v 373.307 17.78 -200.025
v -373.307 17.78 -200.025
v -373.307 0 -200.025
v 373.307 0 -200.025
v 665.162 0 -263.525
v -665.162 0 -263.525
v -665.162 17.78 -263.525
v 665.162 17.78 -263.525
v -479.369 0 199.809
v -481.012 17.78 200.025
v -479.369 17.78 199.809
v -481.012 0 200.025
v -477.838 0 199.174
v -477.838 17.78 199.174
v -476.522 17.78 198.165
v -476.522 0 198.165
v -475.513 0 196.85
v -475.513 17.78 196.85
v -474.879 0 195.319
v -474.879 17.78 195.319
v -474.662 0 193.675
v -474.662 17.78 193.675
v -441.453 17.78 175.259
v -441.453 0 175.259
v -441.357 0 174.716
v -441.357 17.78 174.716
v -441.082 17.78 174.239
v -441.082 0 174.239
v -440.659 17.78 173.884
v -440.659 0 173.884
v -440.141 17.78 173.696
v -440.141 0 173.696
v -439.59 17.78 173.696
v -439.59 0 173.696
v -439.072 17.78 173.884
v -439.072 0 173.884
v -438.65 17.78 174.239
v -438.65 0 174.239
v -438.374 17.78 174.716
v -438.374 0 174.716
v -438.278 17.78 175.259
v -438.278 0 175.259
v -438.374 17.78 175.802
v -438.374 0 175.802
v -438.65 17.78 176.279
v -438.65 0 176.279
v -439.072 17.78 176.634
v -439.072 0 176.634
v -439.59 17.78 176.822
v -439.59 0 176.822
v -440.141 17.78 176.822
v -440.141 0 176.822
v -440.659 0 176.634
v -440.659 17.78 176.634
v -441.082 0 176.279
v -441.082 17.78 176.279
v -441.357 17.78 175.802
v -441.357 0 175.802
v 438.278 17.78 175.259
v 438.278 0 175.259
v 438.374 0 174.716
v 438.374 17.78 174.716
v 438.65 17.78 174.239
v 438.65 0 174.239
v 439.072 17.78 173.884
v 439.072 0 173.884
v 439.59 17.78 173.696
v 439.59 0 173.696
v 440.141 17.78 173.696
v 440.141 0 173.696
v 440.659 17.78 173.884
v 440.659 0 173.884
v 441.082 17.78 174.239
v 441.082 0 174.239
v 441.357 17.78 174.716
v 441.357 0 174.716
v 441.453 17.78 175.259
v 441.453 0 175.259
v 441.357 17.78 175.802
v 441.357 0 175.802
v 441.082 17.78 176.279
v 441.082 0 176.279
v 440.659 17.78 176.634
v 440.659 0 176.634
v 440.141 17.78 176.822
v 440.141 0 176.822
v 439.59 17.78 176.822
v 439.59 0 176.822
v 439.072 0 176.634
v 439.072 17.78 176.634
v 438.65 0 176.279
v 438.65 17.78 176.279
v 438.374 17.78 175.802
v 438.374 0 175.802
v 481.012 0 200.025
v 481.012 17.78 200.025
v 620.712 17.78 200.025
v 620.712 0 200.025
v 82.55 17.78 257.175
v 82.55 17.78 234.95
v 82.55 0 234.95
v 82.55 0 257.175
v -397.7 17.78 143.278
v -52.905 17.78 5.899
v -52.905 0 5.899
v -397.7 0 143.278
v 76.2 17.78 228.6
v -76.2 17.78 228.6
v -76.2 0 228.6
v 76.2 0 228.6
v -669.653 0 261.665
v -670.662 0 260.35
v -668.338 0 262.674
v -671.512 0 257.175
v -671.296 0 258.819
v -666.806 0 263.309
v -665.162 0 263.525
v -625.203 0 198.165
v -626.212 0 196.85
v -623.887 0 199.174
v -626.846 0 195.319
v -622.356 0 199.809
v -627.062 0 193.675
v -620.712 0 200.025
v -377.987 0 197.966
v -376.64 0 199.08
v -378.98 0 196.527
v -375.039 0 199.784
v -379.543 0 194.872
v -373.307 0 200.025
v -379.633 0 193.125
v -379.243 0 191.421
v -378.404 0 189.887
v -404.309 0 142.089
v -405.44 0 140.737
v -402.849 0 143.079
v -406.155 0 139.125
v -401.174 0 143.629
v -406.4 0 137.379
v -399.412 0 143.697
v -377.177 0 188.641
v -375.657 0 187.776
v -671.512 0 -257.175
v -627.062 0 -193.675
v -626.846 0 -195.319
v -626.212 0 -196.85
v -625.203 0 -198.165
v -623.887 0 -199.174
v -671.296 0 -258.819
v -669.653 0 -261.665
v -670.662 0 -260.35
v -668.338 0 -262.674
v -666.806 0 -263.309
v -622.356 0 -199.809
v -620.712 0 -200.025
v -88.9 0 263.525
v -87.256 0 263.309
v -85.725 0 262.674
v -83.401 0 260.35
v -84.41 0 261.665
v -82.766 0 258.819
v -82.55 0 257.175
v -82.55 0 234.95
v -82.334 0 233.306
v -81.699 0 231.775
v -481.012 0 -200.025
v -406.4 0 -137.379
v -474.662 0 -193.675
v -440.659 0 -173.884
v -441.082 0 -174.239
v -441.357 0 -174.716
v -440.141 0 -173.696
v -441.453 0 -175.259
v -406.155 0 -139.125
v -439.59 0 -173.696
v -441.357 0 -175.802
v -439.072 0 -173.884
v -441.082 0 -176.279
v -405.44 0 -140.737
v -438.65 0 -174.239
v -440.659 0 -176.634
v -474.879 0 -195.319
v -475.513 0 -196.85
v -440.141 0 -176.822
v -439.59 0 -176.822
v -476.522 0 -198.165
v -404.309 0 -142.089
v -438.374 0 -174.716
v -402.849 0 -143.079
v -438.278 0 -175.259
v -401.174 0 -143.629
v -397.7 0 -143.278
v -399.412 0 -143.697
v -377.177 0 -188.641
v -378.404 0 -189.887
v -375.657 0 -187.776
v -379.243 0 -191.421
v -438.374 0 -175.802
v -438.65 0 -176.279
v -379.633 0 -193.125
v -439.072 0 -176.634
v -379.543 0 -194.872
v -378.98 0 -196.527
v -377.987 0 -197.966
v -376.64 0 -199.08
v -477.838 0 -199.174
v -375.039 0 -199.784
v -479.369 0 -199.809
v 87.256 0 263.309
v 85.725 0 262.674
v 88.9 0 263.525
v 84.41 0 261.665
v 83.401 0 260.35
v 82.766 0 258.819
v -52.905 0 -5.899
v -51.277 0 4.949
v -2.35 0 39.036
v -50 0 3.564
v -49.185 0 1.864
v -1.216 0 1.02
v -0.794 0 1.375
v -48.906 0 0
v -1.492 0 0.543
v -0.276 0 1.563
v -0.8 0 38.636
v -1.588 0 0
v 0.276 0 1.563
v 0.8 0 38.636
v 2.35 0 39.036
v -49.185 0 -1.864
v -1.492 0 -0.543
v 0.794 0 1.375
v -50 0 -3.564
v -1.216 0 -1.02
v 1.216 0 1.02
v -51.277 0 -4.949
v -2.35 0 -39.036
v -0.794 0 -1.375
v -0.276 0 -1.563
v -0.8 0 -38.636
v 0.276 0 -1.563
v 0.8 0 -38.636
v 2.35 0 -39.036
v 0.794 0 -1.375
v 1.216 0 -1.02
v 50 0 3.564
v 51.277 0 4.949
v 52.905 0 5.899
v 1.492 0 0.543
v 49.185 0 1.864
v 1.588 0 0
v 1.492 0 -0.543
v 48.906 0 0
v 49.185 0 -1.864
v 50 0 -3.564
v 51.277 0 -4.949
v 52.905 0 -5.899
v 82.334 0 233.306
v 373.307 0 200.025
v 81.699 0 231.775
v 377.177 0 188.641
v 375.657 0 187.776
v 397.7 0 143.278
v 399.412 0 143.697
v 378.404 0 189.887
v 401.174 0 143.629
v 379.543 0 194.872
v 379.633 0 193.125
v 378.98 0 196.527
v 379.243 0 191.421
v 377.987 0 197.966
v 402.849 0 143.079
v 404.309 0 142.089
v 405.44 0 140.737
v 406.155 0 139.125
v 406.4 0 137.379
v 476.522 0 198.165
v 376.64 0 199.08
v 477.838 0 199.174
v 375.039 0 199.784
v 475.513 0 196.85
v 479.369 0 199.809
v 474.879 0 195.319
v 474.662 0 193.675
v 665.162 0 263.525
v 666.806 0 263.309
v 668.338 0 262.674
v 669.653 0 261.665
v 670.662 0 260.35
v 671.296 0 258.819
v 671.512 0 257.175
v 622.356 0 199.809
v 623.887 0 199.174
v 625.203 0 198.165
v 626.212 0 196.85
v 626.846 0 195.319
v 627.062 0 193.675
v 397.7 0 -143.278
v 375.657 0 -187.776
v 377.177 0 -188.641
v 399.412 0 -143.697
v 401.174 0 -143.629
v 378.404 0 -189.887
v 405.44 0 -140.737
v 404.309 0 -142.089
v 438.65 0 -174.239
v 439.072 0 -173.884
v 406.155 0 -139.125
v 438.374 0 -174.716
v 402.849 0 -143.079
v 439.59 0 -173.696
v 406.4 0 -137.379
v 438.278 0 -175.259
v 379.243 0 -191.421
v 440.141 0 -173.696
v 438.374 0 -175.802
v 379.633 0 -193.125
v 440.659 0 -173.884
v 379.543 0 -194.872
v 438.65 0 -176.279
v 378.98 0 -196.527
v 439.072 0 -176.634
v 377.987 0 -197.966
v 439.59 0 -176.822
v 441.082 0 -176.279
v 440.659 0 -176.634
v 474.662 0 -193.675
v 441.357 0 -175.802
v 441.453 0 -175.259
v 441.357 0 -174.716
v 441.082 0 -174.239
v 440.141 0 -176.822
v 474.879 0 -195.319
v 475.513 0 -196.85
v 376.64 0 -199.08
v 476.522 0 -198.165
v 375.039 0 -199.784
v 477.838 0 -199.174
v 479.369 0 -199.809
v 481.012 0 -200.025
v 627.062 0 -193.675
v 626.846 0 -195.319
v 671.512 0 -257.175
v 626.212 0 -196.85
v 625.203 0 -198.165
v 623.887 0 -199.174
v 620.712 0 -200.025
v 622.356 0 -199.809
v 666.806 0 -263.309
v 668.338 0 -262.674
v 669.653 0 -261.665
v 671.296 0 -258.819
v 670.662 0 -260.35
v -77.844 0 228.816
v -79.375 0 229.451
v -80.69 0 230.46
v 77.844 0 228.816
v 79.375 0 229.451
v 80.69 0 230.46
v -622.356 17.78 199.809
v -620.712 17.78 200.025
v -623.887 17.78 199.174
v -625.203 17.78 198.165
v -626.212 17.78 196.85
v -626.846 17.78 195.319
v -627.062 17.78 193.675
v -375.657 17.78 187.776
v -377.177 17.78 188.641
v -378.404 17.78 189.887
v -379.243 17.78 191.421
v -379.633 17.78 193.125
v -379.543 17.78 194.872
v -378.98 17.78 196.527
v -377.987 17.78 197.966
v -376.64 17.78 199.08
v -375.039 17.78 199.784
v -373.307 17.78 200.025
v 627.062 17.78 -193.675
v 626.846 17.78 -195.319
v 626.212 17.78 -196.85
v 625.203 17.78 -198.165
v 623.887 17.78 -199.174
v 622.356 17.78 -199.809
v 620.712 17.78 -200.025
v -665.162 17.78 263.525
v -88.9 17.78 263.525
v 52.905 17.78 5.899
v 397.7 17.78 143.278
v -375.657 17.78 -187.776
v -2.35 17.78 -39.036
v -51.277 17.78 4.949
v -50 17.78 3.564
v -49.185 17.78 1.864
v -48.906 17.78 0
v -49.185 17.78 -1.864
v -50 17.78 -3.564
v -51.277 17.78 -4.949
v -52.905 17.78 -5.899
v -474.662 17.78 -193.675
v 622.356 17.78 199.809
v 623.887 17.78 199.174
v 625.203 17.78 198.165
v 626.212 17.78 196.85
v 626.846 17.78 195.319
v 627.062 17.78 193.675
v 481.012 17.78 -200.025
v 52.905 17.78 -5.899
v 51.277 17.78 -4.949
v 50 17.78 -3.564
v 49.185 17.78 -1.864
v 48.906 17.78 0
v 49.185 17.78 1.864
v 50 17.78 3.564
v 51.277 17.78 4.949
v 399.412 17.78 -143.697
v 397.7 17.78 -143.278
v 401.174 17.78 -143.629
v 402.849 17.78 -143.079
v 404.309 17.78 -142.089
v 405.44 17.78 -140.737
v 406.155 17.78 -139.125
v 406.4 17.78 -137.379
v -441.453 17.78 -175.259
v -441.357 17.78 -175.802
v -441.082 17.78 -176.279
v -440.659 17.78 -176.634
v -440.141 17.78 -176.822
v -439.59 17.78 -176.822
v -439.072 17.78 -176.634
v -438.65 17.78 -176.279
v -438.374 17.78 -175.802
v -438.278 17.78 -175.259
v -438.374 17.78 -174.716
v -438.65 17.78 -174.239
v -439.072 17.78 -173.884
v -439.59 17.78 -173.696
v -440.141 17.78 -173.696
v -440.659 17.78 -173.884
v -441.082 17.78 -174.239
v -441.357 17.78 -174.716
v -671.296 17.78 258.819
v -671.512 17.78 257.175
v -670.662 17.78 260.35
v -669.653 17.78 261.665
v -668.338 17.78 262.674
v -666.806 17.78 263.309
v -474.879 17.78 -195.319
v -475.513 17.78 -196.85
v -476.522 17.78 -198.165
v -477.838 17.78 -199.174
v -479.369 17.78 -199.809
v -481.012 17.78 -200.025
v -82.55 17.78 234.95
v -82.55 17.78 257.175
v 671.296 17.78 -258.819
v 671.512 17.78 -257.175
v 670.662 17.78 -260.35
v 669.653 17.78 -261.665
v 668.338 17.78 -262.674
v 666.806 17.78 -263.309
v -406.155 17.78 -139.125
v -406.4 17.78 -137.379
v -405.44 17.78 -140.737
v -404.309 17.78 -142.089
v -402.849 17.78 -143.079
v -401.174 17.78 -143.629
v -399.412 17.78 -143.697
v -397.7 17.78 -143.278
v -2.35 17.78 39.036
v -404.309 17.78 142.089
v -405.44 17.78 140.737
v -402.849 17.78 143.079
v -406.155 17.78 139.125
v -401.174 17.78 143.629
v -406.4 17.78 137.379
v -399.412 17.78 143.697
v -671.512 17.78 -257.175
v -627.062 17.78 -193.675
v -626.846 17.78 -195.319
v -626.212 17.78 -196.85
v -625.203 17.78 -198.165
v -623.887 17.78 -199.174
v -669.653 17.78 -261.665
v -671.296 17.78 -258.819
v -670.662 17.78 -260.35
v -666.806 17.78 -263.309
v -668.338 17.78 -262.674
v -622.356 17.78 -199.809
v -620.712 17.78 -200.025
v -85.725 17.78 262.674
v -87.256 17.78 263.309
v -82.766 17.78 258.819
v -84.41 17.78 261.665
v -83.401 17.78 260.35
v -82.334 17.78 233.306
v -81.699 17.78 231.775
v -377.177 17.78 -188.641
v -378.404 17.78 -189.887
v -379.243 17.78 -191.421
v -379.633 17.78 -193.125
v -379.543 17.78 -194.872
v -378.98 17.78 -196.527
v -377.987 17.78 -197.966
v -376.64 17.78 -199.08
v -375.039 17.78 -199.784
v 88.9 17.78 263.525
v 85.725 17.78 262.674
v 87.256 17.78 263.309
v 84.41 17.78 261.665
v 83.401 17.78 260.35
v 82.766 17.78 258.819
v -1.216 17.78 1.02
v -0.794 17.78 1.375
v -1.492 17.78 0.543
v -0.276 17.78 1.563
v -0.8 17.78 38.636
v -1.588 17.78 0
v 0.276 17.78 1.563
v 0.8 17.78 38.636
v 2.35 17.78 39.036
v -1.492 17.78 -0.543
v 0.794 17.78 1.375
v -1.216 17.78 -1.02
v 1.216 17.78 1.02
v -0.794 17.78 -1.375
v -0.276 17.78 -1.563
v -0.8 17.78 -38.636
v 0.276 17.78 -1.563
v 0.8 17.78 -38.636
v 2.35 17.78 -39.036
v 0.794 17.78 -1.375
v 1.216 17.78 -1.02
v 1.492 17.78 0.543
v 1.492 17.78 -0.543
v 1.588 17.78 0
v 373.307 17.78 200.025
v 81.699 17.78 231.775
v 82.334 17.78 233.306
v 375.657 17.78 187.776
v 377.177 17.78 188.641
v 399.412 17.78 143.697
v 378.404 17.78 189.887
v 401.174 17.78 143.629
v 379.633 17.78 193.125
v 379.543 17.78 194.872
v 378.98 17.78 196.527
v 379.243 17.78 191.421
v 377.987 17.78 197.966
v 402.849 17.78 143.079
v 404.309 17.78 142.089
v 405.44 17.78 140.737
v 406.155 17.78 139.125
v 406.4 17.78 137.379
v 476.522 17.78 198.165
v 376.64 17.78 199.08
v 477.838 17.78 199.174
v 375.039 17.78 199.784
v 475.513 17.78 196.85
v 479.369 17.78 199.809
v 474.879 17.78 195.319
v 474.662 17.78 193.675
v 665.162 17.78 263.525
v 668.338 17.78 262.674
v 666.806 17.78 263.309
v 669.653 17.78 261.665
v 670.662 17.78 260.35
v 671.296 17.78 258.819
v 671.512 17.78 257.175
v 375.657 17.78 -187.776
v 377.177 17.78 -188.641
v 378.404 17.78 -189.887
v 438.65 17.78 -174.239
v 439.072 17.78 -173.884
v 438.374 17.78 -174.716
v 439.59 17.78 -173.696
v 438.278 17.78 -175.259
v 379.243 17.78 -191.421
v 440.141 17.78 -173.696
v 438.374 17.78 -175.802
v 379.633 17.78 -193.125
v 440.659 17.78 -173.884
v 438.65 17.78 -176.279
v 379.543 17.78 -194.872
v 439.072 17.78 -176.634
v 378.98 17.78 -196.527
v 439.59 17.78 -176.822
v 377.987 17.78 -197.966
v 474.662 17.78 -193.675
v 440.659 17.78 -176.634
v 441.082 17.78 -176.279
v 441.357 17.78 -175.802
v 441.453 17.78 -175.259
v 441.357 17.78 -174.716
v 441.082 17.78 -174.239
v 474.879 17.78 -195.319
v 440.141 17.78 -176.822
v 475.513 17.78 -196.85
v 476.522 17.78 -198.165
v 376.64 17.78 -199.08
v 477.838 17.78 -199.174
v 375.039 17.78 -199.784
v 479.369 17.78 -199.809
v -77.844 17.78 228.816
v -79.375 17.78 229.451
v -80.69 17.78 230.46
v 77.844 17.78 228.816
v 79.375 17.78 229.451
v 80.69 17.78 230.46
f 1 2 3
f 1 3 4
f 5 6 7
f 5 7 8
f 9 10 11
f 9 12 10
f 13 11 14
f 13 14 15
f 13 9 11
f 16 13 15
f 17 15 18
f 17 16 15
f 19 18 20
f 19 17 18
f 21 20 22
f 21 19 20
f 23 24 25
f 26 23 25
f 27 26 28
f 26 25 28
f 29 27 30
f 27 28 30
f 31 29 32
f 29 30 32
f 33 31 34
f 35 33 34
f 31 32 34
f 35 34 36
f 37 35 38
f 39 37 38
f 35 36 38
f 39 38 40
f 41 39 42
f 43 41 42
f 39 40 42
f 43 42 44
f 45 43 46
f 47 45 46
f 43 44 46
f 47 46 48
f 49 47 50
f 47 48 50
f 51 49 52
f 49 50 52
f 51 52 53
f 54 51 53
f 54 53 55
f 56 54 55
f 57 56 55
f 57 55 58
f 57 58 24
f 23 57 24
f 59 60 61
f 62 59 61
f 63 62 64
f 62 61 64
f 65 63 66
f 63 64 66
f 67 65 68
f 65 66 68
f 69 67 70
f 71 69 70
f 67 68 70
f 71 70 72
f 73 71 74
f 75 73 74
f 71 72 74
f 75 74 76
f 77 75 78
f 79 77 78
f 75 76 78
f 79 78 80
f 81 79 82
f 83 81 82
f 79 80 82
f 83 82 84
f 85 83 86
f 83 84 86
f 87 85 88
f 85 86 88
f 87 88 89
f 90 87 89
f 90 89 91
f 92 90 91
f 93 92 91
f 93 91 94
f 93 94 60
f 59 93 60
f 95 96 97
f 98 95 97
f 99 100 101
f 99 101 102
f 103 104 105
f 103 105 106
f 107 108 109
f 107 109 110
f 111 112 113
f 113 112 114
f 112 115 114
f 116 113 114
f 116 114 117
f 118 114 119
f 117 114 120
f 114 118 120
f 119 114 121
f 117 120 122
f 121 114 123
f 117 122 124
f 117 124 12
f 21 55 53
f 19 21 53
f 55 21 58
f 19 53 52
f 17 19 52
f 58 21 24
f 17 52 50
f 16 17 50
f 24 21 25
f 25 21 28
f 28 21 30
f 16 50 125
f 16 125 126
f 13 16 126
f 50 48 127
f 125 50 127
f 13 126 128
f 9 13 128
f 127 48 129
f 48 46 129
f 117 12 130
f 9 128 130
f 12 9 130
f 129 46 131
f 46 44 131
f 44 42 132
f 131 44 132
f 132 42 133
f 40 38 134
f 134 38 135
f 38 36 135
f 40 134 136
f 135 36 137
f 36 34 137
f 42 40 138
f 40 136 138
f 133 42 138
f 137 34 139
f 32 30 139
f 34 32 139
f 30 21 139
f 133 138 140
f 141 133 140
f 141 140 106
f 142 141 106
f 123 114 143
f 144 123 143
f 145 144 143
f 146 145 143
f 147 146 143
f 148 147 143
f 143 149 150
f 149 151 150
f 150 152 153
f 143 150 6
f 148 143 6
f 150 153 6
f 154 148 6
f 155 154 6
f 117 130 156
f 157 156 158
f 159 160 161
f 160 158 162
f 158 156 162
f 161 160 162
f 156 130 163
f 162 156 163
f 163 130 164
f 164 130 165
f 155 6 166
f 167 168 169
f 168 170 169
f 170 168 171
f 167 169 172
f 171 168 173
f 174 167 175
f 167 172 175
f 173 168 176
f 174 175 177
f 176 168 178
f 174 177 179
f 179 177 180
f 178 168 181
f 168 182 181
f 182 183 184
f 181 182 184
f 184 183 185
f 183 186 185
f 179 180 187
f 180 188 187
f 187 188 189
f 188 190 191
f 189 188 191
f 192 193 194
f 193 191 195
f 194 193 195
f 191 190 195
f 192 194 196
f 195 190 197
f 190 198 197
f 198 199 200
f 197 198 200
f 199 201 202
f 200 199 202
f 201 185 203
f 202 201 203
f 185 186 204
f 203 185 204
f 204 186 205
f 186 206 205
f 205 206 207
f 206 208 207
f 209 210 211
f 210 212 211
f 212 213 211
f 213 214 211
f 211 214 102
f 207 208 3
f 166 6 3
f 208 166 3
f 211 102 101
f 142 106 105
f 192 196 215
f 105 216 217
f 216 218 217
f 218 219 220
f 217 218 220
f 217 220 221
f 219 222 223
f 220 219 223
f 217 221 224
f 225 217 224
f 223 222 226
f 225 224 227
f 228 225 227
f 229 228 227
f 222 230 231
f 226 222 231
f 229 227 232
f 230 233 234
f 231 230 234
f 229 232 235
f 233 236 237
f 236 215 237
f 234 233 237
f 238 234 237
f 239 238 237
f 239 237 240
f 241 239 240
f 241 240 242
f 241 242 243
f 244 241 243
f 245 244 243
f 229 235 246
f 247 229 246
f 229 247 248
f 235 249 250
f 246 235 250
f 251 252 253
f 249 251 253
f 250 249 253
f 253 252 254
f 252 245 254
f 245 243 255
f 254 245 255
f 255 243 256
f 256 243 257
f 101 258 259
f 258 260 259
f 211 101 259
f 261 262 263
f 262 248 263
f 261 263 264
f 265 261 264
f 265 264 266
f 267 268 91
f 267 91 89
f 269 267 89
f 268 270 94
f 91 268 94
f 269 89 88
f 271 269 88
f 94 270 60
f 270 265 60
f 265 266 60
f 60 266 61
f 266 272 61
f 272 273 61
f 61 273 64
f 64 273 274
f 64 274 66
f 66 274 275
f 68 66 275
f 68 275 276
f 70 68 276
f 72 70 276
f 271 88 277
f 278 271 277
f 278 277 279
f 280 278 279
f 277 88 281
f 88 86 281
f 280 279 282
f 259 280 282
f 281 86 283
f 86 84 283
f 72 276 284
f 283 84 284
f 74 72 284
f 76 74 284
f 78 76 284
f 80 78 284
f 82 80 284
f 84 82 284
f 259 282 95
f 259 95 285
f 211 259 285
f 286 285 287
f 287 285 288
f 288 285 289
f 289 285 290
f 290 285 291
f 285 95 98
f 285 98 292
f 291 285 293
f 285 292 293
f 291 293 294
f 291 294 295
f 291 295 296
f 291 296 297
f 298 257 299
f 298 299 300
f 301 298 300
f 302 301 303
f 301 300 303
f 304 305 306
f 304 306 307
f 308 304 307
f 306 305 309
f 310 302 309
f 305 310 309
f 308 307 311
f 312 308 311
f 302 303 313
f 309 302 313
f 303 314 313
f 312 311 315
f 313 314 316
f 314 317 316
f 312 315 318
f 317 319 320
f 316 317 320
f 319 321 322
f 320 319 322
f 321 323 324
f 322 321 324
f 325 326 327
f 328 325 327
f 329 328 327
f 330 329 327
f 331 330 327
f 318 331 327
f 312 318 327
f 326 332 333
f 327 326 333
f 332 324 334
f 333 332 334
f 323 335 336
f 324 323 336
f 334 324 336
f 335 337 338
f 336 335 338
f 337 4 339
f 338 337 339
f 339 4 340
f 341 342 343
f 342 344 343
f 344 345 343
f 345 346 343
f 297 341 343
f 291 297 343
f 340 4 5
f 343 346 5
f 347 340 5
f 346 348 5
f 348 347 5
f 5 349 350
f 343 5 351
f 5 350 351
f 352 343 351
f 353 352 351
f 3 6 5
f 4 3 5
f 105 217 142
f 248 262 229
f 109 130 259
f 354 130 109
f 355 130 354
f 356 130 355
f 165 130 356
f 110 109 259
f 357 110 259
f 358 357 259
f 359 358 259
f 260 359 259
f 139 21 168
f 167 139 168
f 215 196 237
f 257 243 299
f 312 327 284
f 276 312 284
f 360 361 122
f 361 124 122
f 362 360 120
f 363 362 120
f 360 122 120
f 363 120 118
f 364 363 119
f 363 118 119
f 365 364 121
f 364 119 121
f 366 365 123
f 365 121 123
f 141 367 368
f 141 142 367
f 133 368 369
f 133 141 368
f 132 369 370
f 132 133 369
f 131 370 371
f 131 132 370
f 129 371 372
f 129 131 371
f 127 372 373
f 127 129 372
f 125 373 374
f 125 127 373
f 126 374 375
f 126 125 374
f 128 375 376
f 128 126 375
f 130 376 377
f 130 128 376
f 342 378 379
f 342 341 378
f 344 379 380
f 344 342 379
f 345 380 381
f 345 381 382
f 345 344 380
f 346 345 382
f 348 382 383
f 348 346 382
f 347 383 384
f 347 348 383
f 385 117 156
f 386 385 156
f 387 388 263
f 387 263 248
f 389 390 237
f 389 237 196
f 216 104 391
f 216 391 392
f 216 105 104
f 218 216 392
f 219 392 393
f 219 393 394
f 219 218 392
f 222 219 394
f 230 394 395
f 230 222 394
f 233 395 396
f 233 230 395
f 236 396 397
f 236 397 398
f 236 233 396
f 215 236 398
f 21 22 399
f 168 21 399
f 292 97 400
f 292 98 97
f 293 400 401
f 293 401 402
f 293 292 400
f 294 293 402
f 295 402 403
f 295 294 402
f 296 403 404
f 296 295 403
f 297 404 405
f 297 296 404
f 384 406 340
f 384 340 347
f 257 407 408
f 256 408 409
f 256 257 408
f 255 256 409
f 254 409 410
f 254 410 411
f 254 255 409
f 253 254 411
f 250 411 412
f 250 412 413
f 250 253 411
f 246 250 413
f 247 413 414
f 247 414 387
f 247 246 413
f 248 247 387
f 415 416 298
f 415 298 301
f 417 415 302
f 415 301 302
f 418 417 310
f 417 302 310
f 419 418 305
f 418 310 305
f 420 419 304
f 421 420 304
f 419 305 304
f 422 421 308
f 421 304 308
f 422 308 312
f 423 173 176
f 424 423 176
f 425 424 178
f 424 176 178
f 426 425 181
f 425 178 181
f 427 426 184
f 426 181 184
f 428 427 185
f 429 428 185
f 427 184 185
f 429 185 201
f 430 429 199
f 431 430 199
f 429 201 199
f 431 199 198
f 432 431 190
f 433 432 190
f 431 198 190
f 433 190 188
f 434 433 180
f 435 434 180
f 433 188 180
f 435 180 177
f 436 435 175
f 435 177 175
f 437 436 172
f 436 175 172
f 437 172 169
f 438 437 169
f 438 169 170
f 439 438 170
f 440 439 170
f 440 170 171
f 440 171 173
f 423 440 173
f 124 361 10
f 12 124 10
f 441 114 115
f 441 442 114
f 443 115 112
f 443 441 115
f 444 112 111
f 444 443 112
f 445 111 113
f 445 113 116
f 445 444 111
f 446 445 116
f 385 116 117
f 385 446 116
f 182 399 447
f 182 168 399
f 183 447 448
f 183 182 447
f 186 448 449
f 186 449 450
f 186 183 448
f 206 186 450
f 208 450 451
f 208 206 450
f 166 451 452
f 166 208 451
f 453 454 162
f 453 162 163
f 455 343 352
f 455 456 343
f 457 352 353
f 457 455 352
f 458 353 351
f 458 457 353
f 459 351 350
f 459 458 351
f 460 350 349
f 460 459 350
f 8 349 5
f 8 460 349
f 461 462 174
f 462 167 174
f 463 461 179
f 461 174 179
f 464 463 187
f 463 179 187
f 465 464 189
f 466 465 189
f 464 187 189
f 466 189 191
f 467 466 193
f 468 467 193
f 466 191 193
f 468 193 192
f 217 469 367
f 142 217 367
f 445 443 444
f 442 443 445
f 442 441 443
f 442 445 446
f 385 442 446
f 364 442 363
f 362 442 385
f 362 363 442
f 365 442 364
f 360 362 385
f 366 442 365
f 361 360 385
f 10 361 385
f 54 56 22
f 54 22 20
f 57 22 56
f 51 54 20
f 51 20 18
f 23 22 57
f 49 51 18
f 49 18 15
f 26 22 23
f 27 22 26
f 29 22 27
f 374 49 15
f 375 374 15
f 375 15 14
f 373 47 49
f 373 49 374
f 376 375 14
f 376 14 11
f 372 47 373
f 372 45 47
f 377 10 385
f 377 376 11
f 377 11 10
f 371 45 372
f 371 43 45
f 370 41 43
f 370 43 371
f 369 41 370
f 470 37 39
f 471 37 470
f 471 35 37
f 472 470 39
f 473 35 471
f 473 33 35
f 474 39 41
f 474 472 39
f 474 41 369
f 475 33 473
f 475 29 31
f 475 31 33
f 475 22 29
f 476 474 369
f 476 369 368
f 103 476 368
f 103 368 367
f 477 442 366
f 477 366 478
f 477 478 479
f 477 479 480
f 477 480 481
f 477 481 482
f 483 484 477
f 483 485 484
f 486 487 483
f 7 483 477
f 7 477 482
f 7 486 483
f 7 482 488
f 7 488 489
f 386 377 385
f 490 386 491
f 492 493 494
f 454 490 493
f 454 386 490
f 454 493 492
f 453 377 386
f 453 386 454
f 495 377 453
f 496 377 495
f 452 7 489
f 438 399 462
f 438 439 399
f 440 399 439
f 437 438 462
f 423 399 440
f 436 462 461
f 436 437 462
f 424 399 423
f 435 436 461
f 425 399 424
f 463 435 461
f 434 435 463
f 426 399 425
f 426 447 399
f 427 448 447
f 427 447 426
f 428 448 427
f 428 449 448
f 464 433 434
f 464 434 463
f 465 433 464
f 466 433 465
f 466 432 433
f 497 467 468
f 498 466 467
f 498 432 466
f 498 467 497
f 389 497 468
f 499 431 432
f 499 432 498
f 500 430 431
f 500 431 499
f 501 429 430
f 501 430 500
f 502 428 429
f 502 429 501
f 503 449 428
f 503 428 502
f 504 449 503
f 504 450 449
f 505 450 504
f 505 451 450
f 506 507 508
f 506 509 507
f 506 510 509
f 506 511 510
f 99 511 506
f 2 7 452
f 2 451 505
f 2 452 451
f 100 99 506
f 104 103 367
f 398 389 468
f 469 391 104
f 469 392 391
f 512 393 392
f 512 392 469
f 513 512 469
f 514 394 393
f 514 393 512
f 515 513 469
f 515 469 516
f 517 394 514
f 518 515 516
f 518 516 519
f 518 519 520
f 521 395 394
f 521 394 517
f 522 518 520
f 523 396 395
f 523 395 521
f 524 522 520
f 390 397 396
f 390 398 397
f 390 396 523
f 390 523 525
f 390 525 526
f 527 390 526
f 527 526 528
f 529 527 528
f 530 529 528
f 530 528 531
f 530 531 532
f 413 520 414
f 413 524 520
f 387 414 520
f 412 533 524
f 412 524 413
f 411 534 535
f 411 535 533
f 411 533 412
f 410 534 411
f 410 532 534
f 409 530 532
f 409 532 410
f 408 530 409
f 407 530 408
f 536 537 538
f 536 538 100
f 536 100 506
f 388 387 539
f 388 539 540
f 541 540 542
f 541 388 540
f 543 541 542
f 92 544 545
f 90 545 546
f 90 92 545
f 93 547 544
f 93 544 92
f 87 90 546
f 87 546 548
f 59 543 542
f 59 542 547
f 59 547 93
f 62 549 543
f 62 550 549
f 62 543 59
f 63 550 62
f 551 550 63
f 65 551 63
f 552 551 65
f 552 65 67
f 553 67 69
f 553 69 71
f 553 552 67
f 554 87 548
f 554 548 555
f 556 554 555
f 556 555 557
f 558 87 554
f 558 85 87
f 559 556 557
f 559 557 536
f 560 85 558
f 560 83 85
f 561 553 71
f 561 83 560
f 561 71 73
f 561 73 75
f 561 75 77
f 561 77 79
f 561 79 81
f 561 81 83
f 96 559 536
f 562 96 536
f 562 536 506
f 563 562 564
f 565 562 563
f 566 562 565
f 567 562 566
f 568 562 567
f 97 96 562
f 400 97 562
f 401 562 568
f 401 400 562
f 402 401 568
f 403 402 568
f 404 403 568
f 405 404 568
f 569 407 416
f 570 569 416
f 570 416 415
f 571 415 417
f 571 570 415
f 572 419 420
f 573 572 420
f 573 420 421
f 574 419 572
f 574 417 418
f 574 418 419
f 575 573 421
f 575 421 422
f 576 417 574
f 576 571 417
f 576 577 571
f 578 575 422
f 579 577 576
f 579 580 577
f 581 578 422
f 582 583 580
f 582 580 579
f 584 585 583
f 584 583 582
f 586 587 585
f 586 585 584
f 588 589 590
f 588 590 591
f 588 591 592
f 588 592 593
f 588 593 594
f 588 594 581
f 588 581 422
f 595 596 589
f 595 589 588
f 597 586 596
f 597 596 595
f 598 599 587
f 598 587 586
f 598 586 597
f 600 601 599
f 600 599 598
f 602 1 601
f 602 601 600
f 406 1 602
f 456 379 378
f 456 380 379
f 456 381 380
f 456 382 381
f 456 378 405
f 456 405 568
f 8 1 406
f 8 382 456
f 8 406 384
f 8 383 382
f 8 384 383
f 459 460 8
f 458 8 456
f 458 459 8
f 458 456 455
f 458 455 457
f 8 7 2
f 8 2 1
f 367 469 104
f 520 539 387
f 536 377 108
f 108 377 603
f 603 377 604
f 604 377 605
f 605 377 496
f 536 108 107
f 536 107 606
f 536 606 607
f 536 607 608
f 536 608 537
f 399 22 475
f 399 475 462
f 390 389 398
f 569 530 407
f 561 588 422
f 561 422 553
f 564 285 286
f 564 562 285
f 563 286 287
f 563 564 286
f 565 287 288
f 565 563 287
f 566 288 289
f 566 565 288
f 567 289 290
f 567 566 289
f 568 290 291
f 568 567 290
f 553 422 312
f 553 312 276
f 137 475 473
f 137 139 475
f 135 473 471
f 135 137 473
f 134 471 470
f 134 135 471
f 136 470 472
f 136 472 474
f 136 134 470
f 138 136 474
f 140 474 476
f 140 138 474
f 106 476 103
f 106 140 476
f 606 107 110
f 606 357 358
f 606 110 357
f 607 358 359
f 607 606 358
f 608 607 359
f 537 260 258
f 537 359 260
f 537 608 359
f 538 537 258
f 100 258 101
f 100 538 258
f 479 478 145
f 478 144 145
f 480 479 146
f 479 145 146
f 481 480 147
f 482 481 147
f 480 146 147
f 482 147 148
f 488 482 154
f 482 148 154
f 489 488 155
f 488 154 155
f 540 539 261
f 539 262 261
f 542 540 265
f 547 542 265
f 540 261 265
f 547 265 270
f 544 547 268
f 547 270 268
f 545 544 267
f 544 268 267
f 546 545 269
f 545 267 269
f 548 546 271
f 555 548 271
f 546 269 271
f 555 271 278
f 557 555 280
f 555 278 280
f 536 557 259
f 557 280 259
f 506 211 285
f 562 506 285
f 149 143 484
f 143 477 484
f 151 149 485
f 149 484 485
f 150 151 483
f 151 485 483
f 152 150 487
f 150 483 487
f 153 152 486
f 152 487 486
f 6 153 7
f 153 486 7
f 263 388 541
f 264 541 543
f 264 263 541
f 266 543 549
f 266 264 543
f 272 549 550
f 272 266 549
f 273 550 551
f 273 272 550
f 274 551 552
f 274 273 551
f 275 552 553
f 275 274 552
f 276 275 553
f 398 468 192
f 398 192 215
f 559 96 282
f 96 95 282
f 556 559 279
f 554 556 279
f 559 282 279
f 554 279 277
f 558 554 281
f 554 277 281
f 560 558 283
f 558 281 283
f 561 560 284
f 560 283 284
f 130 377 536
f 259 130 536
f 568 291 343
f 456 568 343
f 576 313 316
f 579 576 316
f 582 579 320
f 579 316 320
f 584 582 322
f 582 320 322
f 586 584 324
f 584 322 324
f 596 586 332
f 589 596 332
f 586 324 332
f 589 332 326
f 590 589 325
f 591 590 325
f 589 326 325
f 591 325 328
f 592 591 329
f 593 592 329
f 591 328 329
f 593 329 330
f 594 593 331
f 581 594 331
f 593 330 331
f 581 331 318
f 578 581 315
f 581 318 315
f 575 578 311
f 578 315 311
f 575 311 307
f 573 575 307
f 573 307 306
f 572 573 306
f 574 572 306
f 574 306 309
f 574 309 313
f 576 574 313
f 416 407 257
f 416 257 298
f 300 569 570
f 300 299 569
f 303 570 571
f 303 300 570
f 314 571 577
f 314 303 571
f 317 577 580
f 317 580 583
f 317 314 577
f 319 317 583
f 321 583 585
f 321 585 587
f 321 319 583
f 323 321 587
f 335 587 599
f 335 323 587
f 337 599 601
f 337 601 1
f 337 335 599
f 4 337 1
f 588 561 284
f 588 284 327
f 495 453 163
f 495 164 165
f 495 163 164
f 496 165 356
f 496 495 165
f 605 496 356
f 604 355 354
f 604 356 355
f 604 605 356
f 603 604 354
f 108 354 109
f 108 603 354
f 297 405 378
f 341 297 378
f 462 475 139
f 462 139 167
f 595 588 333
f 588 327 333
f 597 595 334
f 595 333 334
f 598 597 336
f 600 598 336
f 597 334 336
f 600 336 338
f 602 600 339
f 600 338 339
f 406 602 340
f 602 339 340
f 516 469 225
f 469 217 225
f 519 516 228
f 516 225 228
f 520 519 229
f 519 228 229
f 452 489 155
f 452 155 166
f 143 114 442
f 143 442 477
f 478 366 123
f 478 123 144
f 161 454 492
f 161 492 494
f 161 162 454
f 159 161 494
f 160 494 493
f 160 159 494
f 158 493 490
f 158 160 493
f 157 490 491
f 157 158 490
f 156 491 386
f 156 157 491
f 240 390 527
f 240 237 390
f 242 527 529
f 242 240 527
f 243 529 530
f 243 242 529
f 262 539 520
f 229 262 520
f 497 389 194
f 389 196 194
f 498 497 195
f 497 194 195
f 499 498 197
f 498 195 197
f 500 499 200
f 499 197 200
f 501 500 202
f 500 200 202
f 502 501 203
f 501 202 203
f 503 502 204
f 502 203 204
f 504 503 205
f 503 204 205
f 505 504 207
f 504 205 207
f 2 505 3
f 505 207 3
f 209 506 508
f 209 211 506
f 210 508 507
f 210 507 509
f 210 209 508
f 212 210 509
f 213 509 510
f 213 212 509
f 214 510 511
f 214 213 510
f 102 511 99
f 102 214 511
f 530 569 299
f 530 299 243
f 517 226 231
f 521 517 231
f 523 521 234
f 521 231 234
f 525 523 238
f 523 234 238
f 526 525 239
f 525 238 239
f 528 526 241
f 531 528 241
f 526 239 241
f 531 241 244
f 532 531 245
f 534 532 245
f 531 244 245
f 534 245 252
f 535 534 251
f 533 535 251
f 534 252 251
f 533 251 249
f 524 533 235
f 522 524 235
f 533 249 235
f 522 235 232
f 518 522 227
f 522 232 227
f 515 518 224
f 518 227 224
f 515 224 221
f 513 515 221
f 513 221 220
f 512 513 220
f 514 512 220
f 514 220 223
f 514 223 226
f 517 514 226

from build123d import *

# Parameters (mm, degrees)
SKETCH1_W                    = 1343.025
SKETCH1_H                    = 527.05
BOSS_EXTRUDE1_DEPTH          = 17.78
FILLET1_R                    = 6.35
SKETCH5_W                    = 152.4
SKETCH5_H                    = 400.05
CUT_EXTRUDE1_DEPTH           = 18.78
F_1_8_0_125_DIAMETER_HOLE2_D = 3.175
CUT_EXTRUDE2_DEPTH           = 18.78
FILLET2_R                    = 6.35


with BuildPart() as part:
    # Sketch1 → Boss-Extrude1 (new body)
    with BuildSketch(Plane(origin=(0, 0, 0), x_dir=(1, 0, 0), z_dir=(0, 1, 0))):
        Rectangle(SKETCH1_W, SKETCH1_H)
    extrude(amount=BOSS_EXTRUDE1_DEPTH)

    # Fillet1
    fillet1_edges = [part.edges().sort_by_distance(p)[0] for p in [
        (671.5125, 8.89, 263.525),
        (-671.5125, 8.89, 263.525),
        (-671.5125, 8.89, -263.525),
        (671.5125, 8.89, -263.525),
    ]]
    fillet(fillet1_edges, radius=FILLET1_R)

    # Sketch5 → Cut-Extrude1 (cut, through all)
    with BuildSketch(Plane(origin=(0, 17.78, 0), x_dir=(1, 0, 0), z_dir=(0, 1, 0))):
        Polygon((-406.4, 200.025), (406.4, 200.025), (0, 38.1), align=None)
        Polygon((0, -38.1), (-406.4, -200.025), (406.4, -200.025), align=None)
        Polygon((406.4, 146.74453125), (406.4, -146.74453125), (38.1, 0), align=None)
        Polygon((-406.4, 146.74453125), (-38.1, 0), (-406.4, -146.74453125), align=None)
        with Locations((550.8625, 0)):
            Rectangle(SKETCH5_W, SKETCH5_H)
        with Locations((-550.8625, 0)):
            Rectangle(SKETCH5_W, SKETCH5_H)
    extrude(amount=-CUT_EXTRUDE1_DEPTH, mode=Mode.SUBTRACT)

    # 1/8 (0.125) Diameter Hole2 (through all)
    with Locations(Plane(origin=(0, 17.78, 0), x_dir=(1, 0, 0), z_dir=(0, 1, 0))):
        with Locations((0, 0), (-439.865615282, -175.258956089), (439.865615282, 175.258956089), (439.865615282, -175.258956089), (-439.865615282, 175.258956089)):
            Hole(F_1_8_0_125_DIAMETER_HOLE2_D / 2)

    # Sketch8 → Cut-Extrude2 (cut, through all)
    with BuildSketch(Plane(origin=(0, 17.78, 0), x_dir=(1, 0, 0), z_dir=(0, 1, 0))):
        with BuildLine():
            Line((-82.55, -263.525), (-82.55, -234.95))
            ThreePointArc((-82.55, -234.95), (-80.690128061, -230.459871939), (-76.2, -228.6))
            Line((-76.2, -228.6), (76.2, -228.6))
            ThreePointArc((76.2, -228.6), (80.690128061, -230.459871939), (82.55, -234.95))
            Line((82.55, -234.95), (82.55, -263.525))
            Line((82.55, -263.525), (-82.55, -263.525))
        make_face()
    extrude(amount=-CUT_EXTRUDE2_DEPTH, mode=Mode.SUBTRACT)

    # Fillet2
    fillet2_edges = [part.edges().sort_by_distance(p)[0] for p in [
        (82.55, 8.89, 263.525),
        (-82.55, 8.89, 263.525),
        (406.4, 8.89, -200.025),
        (0, 8.89, -38.1),
        (-406.4, 8.89, -200.025),
        (-474.6625, 8.89, -200.025),
        (-474.6625, 8.89, 200.025),
        (-627.0625, 8.89, 200.025),
        (-627.0625, 8.89, -200.025),
        (-406.4, 8.89, 146.74453125),
        (-406.4, 8.89, -146.74453125),
        (-38.1, 8.89, 0),
        (627.0625, 8.89, -200.025),
        (627.0625, 8.89, 200.025),
        (474.6625, 8.89, 200.025),
        (474.6625, 8.89, -200.025),
        (0, 8.89, 38.1),
        (406.4, 8.89, 200.025),
        (-406.4, 8.89, 200.025),
        (38.1, 8.89, 0),
        (406.4, 8.89, -146.74453125),
        (406.4, 8.89, 146.74453125),
    ]]
    fillet(fillet2_edges, radius=FILLET2_R)


solid = part.part
